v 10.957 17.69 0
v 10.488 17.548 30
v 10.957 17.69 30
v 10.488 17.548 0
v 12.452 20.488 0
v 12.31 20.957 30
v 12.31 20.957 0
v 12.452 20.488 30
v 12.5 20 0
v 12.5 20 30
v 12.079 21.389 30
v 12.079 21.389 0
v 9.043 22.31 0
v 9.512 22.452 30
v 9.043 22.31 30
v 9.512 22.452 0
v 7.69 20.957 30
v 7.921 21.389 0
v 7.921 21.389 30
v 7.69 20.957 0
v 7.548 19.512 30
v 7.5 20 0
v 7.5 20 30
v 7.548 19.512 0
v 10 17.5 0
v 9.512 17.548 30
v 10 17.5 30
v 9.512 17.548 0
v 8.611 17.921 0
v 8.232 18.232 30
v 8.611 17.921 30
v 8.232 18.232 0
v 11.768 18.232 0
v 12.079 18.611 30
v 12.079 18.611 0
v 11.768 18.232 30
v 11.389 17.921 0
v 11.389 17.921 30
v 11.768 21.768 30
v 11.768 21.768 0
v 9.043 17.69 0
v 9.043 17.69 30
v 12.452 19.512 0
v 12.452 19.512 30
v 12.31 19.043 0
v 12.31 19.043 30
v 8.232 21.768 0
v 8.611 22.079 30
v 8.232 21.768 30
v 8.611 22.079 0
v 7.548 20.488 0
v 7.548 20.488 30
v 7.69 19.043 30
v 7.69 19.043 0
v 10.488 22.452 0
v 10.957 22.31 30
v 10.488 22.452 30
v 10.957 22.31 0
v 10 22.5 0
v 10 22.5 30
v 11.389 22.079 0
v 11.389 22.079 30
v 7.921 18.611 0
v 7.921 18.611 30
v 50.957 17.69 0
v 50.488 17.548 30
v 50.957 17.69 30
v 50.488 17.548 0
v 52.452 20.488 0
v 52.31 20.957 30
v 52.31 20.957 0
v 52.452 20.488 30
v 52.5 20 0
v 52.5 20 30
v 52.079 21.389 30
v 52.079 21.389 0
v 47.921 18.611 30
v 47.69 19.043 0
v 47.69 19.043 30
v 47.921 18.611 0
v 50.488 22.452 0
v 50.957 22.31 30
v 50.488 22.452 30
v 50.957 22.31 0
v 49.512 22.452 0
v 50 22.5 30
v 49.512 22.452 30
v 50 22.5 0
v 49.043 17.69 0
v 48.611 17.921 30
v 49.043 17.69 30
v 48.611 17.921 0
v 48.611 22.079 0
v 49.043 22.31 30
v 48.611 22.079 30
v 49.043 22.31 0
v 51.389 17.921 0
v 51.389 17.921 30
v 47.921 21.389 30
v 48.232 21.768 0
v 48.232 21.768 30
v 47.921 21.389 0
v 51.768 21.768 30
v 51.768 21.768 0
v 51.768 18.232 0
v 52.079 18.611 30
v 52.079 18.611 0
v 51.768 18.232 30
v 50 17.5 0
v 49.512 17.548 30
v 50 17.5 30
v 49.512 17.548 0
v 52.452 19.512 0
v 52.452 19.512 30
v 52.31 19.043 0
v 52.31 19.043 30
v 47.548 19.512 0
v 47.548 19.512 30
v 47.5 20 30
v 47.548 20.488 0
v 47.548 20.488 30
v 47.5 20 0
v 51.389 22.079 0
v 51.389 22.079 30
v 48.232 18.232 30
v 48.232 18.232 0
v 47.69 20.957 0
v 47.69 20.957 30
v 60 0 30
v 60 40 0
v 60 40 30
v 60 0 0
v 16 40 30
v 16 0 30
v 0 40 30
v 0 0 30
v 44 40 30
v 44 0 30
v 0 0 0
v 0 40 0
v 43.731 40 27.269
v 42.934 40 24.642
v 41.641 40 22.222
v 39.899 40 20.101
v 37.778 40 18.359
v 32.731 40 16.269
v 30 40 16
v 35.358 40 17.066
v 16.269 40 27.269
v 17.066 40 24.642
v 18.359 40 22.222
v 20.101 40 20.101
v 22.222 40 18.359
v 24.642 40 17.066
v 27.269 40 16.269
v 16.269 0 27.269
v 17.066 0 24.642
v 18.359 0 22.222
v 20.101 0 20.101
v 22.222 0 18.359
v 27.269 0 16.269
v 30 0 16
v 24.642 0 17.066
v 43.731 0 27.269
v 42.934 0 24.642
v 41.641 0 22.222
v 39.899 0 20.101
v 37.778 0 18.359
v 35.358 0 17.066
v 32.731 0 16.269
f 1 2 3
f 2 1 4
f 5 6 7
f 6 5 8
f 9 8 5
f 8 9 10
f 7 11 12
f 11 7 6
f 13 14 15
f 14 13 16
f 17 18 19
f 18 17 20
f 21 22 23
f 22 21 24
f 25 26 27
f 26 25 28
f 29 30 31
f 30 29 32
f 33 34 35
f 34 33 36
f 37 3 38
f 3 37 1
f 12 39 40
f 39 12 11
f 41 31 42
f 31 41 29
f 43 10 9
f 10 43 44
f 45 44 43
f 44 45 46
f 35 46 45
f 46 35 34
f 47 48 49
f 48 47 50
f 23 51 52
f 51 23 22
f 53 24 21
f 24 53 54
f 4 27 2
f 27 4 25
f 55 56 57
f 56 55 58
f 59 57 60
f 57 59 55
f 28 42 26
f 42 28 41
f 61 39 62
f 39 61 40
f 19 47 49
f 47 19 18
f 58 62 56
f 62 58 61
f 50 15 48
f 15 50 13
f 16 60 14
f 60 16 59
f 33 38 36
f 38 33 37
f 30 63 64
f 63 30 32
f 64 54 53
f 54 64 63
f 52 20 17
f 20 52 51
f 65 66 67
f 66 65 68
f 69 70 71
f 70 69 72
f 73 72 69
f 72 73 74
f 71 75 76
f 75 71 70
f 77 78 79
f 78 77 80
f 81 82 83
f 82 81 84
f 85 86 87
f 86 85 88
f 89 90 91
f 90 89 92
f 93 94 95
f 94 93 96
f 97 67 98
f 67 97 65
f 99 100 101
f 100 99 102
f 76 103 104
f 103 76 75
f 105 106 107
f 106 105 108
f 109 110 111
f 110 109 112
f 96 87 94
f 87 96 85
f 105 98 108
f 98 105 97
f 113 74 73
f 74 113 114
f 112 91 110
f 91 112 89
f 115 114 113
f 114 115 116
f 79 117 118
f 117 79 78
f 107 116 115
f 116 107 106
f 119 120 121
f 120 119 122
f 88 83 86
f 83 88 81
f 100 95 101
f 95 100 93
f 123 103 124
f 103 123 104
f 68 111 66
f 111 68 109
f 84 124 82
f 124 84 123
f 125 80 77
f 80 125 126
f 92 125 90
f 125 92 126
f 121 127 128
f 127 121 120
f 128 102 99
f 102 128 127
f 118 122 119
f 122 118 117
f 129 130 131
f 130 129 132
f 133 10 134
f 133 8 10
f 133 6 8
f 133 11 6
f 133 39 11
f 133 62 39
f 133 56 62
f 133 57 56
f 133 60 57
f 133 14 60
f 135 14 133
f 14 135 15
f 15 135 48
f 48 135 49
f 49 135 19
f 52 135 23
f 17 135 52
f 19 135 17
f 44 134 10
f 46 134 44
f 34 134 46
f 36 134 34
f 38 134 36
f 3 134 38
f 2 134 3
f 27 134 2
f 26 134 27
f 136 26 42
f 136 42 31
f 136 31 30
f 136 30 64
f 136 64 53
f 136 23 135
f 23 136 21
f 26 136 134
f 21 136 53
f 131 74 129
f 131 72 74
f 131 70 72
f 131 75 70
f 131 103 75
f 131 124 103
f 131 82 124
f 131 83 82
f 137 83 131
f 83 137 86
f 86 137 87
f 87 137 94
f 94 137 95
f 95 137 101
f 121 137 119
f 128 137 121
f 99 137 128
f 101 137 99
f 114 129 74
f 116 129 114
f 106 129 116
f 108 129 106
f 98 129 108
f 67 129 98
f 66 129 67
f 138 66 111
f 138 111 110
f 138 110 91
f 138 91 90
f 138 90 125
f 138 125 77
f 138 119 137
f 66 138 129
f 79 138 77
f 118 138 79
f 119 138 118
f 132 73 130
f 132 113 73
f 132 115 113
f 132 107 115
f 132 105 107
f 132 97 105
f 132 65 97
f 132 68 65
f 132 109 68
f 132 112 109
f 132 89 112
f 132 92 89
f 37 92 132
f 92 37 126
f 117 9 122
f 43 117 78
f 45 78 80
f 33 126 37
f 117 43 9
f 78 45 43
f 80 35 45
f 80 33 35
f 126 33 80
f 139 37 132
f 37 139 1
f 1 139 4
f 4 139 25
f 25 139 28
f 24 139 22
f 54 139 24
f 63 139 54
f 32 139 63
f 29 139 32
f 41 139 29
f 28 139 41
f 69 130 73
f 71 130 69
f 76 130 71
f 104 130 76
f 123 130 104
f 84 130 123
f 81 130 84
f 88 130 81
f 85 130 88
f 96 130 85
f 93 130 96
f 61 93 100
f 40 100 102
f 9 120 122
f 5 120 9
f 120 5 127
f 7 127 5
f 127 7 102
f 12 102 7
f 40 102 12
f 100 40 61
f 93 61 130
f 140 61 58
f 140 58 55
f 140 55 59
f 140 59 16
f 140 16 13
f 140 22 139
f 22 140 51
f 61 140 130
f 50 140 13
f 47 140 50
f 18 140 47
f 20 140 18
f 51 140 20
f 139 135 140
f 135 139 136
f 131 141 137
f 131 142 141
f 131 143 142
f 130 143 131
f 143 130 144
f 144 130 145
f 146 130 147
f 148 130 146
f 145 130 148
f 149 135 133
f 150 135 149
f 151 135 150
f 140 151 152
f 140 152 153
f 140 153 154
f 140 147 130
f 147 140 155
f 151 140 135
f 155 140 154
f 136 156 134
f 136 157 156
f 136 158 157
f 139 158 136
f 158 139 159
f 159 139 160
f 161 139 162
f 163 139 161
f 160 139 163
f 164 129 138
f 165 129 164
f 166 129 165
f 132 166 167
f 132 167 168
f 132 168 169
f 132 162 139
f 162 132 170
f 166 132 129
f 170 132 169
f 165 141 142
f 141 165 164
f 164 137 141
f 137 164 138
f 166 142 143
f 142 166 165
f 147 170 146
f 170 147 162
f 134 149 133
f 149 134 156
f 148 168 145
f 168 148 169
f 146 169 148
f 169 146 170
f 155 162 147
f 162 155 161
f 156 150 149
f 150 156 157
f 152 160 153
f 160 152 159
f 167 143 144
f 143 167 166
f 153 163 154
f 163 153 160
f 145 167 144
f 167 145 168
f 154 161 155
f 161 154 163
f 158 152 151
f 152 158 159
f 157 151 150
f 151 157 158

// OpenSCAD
$fn = 32;

// ----------------------------------------------------------------------
// Saddle clamp: plain shaft clamp
// ----------------------------------------------------------------------

// --- parameters (mm) ---
blk_l = 60;               // block length, X
blk_w = 40;               // block width, Y
blk_h = 30;               // block height
clamp_r = 14;             // shaft groove radius
hole_r = 2.5;             // bolt hole radius
hole_m = 10;              // bolt hole margin from the ends

saw_depth = clamp_r + 3;  // saw kerf depth

difference() {
  cube([blk_l, blk_w, blk_h]);
  translate([blk_l / 2, -1, blk_h])
    rotate([-90, 0, 0])
      cylinder(h = blk_w + 2, r = clamp_r);
  for (sx = [0, 1])
    translate([sx ? blk_l - hole_m : hole_m, blk_w / 2, -1])
      cylinder(r = hole_r, h = blk_h + 2);
}
